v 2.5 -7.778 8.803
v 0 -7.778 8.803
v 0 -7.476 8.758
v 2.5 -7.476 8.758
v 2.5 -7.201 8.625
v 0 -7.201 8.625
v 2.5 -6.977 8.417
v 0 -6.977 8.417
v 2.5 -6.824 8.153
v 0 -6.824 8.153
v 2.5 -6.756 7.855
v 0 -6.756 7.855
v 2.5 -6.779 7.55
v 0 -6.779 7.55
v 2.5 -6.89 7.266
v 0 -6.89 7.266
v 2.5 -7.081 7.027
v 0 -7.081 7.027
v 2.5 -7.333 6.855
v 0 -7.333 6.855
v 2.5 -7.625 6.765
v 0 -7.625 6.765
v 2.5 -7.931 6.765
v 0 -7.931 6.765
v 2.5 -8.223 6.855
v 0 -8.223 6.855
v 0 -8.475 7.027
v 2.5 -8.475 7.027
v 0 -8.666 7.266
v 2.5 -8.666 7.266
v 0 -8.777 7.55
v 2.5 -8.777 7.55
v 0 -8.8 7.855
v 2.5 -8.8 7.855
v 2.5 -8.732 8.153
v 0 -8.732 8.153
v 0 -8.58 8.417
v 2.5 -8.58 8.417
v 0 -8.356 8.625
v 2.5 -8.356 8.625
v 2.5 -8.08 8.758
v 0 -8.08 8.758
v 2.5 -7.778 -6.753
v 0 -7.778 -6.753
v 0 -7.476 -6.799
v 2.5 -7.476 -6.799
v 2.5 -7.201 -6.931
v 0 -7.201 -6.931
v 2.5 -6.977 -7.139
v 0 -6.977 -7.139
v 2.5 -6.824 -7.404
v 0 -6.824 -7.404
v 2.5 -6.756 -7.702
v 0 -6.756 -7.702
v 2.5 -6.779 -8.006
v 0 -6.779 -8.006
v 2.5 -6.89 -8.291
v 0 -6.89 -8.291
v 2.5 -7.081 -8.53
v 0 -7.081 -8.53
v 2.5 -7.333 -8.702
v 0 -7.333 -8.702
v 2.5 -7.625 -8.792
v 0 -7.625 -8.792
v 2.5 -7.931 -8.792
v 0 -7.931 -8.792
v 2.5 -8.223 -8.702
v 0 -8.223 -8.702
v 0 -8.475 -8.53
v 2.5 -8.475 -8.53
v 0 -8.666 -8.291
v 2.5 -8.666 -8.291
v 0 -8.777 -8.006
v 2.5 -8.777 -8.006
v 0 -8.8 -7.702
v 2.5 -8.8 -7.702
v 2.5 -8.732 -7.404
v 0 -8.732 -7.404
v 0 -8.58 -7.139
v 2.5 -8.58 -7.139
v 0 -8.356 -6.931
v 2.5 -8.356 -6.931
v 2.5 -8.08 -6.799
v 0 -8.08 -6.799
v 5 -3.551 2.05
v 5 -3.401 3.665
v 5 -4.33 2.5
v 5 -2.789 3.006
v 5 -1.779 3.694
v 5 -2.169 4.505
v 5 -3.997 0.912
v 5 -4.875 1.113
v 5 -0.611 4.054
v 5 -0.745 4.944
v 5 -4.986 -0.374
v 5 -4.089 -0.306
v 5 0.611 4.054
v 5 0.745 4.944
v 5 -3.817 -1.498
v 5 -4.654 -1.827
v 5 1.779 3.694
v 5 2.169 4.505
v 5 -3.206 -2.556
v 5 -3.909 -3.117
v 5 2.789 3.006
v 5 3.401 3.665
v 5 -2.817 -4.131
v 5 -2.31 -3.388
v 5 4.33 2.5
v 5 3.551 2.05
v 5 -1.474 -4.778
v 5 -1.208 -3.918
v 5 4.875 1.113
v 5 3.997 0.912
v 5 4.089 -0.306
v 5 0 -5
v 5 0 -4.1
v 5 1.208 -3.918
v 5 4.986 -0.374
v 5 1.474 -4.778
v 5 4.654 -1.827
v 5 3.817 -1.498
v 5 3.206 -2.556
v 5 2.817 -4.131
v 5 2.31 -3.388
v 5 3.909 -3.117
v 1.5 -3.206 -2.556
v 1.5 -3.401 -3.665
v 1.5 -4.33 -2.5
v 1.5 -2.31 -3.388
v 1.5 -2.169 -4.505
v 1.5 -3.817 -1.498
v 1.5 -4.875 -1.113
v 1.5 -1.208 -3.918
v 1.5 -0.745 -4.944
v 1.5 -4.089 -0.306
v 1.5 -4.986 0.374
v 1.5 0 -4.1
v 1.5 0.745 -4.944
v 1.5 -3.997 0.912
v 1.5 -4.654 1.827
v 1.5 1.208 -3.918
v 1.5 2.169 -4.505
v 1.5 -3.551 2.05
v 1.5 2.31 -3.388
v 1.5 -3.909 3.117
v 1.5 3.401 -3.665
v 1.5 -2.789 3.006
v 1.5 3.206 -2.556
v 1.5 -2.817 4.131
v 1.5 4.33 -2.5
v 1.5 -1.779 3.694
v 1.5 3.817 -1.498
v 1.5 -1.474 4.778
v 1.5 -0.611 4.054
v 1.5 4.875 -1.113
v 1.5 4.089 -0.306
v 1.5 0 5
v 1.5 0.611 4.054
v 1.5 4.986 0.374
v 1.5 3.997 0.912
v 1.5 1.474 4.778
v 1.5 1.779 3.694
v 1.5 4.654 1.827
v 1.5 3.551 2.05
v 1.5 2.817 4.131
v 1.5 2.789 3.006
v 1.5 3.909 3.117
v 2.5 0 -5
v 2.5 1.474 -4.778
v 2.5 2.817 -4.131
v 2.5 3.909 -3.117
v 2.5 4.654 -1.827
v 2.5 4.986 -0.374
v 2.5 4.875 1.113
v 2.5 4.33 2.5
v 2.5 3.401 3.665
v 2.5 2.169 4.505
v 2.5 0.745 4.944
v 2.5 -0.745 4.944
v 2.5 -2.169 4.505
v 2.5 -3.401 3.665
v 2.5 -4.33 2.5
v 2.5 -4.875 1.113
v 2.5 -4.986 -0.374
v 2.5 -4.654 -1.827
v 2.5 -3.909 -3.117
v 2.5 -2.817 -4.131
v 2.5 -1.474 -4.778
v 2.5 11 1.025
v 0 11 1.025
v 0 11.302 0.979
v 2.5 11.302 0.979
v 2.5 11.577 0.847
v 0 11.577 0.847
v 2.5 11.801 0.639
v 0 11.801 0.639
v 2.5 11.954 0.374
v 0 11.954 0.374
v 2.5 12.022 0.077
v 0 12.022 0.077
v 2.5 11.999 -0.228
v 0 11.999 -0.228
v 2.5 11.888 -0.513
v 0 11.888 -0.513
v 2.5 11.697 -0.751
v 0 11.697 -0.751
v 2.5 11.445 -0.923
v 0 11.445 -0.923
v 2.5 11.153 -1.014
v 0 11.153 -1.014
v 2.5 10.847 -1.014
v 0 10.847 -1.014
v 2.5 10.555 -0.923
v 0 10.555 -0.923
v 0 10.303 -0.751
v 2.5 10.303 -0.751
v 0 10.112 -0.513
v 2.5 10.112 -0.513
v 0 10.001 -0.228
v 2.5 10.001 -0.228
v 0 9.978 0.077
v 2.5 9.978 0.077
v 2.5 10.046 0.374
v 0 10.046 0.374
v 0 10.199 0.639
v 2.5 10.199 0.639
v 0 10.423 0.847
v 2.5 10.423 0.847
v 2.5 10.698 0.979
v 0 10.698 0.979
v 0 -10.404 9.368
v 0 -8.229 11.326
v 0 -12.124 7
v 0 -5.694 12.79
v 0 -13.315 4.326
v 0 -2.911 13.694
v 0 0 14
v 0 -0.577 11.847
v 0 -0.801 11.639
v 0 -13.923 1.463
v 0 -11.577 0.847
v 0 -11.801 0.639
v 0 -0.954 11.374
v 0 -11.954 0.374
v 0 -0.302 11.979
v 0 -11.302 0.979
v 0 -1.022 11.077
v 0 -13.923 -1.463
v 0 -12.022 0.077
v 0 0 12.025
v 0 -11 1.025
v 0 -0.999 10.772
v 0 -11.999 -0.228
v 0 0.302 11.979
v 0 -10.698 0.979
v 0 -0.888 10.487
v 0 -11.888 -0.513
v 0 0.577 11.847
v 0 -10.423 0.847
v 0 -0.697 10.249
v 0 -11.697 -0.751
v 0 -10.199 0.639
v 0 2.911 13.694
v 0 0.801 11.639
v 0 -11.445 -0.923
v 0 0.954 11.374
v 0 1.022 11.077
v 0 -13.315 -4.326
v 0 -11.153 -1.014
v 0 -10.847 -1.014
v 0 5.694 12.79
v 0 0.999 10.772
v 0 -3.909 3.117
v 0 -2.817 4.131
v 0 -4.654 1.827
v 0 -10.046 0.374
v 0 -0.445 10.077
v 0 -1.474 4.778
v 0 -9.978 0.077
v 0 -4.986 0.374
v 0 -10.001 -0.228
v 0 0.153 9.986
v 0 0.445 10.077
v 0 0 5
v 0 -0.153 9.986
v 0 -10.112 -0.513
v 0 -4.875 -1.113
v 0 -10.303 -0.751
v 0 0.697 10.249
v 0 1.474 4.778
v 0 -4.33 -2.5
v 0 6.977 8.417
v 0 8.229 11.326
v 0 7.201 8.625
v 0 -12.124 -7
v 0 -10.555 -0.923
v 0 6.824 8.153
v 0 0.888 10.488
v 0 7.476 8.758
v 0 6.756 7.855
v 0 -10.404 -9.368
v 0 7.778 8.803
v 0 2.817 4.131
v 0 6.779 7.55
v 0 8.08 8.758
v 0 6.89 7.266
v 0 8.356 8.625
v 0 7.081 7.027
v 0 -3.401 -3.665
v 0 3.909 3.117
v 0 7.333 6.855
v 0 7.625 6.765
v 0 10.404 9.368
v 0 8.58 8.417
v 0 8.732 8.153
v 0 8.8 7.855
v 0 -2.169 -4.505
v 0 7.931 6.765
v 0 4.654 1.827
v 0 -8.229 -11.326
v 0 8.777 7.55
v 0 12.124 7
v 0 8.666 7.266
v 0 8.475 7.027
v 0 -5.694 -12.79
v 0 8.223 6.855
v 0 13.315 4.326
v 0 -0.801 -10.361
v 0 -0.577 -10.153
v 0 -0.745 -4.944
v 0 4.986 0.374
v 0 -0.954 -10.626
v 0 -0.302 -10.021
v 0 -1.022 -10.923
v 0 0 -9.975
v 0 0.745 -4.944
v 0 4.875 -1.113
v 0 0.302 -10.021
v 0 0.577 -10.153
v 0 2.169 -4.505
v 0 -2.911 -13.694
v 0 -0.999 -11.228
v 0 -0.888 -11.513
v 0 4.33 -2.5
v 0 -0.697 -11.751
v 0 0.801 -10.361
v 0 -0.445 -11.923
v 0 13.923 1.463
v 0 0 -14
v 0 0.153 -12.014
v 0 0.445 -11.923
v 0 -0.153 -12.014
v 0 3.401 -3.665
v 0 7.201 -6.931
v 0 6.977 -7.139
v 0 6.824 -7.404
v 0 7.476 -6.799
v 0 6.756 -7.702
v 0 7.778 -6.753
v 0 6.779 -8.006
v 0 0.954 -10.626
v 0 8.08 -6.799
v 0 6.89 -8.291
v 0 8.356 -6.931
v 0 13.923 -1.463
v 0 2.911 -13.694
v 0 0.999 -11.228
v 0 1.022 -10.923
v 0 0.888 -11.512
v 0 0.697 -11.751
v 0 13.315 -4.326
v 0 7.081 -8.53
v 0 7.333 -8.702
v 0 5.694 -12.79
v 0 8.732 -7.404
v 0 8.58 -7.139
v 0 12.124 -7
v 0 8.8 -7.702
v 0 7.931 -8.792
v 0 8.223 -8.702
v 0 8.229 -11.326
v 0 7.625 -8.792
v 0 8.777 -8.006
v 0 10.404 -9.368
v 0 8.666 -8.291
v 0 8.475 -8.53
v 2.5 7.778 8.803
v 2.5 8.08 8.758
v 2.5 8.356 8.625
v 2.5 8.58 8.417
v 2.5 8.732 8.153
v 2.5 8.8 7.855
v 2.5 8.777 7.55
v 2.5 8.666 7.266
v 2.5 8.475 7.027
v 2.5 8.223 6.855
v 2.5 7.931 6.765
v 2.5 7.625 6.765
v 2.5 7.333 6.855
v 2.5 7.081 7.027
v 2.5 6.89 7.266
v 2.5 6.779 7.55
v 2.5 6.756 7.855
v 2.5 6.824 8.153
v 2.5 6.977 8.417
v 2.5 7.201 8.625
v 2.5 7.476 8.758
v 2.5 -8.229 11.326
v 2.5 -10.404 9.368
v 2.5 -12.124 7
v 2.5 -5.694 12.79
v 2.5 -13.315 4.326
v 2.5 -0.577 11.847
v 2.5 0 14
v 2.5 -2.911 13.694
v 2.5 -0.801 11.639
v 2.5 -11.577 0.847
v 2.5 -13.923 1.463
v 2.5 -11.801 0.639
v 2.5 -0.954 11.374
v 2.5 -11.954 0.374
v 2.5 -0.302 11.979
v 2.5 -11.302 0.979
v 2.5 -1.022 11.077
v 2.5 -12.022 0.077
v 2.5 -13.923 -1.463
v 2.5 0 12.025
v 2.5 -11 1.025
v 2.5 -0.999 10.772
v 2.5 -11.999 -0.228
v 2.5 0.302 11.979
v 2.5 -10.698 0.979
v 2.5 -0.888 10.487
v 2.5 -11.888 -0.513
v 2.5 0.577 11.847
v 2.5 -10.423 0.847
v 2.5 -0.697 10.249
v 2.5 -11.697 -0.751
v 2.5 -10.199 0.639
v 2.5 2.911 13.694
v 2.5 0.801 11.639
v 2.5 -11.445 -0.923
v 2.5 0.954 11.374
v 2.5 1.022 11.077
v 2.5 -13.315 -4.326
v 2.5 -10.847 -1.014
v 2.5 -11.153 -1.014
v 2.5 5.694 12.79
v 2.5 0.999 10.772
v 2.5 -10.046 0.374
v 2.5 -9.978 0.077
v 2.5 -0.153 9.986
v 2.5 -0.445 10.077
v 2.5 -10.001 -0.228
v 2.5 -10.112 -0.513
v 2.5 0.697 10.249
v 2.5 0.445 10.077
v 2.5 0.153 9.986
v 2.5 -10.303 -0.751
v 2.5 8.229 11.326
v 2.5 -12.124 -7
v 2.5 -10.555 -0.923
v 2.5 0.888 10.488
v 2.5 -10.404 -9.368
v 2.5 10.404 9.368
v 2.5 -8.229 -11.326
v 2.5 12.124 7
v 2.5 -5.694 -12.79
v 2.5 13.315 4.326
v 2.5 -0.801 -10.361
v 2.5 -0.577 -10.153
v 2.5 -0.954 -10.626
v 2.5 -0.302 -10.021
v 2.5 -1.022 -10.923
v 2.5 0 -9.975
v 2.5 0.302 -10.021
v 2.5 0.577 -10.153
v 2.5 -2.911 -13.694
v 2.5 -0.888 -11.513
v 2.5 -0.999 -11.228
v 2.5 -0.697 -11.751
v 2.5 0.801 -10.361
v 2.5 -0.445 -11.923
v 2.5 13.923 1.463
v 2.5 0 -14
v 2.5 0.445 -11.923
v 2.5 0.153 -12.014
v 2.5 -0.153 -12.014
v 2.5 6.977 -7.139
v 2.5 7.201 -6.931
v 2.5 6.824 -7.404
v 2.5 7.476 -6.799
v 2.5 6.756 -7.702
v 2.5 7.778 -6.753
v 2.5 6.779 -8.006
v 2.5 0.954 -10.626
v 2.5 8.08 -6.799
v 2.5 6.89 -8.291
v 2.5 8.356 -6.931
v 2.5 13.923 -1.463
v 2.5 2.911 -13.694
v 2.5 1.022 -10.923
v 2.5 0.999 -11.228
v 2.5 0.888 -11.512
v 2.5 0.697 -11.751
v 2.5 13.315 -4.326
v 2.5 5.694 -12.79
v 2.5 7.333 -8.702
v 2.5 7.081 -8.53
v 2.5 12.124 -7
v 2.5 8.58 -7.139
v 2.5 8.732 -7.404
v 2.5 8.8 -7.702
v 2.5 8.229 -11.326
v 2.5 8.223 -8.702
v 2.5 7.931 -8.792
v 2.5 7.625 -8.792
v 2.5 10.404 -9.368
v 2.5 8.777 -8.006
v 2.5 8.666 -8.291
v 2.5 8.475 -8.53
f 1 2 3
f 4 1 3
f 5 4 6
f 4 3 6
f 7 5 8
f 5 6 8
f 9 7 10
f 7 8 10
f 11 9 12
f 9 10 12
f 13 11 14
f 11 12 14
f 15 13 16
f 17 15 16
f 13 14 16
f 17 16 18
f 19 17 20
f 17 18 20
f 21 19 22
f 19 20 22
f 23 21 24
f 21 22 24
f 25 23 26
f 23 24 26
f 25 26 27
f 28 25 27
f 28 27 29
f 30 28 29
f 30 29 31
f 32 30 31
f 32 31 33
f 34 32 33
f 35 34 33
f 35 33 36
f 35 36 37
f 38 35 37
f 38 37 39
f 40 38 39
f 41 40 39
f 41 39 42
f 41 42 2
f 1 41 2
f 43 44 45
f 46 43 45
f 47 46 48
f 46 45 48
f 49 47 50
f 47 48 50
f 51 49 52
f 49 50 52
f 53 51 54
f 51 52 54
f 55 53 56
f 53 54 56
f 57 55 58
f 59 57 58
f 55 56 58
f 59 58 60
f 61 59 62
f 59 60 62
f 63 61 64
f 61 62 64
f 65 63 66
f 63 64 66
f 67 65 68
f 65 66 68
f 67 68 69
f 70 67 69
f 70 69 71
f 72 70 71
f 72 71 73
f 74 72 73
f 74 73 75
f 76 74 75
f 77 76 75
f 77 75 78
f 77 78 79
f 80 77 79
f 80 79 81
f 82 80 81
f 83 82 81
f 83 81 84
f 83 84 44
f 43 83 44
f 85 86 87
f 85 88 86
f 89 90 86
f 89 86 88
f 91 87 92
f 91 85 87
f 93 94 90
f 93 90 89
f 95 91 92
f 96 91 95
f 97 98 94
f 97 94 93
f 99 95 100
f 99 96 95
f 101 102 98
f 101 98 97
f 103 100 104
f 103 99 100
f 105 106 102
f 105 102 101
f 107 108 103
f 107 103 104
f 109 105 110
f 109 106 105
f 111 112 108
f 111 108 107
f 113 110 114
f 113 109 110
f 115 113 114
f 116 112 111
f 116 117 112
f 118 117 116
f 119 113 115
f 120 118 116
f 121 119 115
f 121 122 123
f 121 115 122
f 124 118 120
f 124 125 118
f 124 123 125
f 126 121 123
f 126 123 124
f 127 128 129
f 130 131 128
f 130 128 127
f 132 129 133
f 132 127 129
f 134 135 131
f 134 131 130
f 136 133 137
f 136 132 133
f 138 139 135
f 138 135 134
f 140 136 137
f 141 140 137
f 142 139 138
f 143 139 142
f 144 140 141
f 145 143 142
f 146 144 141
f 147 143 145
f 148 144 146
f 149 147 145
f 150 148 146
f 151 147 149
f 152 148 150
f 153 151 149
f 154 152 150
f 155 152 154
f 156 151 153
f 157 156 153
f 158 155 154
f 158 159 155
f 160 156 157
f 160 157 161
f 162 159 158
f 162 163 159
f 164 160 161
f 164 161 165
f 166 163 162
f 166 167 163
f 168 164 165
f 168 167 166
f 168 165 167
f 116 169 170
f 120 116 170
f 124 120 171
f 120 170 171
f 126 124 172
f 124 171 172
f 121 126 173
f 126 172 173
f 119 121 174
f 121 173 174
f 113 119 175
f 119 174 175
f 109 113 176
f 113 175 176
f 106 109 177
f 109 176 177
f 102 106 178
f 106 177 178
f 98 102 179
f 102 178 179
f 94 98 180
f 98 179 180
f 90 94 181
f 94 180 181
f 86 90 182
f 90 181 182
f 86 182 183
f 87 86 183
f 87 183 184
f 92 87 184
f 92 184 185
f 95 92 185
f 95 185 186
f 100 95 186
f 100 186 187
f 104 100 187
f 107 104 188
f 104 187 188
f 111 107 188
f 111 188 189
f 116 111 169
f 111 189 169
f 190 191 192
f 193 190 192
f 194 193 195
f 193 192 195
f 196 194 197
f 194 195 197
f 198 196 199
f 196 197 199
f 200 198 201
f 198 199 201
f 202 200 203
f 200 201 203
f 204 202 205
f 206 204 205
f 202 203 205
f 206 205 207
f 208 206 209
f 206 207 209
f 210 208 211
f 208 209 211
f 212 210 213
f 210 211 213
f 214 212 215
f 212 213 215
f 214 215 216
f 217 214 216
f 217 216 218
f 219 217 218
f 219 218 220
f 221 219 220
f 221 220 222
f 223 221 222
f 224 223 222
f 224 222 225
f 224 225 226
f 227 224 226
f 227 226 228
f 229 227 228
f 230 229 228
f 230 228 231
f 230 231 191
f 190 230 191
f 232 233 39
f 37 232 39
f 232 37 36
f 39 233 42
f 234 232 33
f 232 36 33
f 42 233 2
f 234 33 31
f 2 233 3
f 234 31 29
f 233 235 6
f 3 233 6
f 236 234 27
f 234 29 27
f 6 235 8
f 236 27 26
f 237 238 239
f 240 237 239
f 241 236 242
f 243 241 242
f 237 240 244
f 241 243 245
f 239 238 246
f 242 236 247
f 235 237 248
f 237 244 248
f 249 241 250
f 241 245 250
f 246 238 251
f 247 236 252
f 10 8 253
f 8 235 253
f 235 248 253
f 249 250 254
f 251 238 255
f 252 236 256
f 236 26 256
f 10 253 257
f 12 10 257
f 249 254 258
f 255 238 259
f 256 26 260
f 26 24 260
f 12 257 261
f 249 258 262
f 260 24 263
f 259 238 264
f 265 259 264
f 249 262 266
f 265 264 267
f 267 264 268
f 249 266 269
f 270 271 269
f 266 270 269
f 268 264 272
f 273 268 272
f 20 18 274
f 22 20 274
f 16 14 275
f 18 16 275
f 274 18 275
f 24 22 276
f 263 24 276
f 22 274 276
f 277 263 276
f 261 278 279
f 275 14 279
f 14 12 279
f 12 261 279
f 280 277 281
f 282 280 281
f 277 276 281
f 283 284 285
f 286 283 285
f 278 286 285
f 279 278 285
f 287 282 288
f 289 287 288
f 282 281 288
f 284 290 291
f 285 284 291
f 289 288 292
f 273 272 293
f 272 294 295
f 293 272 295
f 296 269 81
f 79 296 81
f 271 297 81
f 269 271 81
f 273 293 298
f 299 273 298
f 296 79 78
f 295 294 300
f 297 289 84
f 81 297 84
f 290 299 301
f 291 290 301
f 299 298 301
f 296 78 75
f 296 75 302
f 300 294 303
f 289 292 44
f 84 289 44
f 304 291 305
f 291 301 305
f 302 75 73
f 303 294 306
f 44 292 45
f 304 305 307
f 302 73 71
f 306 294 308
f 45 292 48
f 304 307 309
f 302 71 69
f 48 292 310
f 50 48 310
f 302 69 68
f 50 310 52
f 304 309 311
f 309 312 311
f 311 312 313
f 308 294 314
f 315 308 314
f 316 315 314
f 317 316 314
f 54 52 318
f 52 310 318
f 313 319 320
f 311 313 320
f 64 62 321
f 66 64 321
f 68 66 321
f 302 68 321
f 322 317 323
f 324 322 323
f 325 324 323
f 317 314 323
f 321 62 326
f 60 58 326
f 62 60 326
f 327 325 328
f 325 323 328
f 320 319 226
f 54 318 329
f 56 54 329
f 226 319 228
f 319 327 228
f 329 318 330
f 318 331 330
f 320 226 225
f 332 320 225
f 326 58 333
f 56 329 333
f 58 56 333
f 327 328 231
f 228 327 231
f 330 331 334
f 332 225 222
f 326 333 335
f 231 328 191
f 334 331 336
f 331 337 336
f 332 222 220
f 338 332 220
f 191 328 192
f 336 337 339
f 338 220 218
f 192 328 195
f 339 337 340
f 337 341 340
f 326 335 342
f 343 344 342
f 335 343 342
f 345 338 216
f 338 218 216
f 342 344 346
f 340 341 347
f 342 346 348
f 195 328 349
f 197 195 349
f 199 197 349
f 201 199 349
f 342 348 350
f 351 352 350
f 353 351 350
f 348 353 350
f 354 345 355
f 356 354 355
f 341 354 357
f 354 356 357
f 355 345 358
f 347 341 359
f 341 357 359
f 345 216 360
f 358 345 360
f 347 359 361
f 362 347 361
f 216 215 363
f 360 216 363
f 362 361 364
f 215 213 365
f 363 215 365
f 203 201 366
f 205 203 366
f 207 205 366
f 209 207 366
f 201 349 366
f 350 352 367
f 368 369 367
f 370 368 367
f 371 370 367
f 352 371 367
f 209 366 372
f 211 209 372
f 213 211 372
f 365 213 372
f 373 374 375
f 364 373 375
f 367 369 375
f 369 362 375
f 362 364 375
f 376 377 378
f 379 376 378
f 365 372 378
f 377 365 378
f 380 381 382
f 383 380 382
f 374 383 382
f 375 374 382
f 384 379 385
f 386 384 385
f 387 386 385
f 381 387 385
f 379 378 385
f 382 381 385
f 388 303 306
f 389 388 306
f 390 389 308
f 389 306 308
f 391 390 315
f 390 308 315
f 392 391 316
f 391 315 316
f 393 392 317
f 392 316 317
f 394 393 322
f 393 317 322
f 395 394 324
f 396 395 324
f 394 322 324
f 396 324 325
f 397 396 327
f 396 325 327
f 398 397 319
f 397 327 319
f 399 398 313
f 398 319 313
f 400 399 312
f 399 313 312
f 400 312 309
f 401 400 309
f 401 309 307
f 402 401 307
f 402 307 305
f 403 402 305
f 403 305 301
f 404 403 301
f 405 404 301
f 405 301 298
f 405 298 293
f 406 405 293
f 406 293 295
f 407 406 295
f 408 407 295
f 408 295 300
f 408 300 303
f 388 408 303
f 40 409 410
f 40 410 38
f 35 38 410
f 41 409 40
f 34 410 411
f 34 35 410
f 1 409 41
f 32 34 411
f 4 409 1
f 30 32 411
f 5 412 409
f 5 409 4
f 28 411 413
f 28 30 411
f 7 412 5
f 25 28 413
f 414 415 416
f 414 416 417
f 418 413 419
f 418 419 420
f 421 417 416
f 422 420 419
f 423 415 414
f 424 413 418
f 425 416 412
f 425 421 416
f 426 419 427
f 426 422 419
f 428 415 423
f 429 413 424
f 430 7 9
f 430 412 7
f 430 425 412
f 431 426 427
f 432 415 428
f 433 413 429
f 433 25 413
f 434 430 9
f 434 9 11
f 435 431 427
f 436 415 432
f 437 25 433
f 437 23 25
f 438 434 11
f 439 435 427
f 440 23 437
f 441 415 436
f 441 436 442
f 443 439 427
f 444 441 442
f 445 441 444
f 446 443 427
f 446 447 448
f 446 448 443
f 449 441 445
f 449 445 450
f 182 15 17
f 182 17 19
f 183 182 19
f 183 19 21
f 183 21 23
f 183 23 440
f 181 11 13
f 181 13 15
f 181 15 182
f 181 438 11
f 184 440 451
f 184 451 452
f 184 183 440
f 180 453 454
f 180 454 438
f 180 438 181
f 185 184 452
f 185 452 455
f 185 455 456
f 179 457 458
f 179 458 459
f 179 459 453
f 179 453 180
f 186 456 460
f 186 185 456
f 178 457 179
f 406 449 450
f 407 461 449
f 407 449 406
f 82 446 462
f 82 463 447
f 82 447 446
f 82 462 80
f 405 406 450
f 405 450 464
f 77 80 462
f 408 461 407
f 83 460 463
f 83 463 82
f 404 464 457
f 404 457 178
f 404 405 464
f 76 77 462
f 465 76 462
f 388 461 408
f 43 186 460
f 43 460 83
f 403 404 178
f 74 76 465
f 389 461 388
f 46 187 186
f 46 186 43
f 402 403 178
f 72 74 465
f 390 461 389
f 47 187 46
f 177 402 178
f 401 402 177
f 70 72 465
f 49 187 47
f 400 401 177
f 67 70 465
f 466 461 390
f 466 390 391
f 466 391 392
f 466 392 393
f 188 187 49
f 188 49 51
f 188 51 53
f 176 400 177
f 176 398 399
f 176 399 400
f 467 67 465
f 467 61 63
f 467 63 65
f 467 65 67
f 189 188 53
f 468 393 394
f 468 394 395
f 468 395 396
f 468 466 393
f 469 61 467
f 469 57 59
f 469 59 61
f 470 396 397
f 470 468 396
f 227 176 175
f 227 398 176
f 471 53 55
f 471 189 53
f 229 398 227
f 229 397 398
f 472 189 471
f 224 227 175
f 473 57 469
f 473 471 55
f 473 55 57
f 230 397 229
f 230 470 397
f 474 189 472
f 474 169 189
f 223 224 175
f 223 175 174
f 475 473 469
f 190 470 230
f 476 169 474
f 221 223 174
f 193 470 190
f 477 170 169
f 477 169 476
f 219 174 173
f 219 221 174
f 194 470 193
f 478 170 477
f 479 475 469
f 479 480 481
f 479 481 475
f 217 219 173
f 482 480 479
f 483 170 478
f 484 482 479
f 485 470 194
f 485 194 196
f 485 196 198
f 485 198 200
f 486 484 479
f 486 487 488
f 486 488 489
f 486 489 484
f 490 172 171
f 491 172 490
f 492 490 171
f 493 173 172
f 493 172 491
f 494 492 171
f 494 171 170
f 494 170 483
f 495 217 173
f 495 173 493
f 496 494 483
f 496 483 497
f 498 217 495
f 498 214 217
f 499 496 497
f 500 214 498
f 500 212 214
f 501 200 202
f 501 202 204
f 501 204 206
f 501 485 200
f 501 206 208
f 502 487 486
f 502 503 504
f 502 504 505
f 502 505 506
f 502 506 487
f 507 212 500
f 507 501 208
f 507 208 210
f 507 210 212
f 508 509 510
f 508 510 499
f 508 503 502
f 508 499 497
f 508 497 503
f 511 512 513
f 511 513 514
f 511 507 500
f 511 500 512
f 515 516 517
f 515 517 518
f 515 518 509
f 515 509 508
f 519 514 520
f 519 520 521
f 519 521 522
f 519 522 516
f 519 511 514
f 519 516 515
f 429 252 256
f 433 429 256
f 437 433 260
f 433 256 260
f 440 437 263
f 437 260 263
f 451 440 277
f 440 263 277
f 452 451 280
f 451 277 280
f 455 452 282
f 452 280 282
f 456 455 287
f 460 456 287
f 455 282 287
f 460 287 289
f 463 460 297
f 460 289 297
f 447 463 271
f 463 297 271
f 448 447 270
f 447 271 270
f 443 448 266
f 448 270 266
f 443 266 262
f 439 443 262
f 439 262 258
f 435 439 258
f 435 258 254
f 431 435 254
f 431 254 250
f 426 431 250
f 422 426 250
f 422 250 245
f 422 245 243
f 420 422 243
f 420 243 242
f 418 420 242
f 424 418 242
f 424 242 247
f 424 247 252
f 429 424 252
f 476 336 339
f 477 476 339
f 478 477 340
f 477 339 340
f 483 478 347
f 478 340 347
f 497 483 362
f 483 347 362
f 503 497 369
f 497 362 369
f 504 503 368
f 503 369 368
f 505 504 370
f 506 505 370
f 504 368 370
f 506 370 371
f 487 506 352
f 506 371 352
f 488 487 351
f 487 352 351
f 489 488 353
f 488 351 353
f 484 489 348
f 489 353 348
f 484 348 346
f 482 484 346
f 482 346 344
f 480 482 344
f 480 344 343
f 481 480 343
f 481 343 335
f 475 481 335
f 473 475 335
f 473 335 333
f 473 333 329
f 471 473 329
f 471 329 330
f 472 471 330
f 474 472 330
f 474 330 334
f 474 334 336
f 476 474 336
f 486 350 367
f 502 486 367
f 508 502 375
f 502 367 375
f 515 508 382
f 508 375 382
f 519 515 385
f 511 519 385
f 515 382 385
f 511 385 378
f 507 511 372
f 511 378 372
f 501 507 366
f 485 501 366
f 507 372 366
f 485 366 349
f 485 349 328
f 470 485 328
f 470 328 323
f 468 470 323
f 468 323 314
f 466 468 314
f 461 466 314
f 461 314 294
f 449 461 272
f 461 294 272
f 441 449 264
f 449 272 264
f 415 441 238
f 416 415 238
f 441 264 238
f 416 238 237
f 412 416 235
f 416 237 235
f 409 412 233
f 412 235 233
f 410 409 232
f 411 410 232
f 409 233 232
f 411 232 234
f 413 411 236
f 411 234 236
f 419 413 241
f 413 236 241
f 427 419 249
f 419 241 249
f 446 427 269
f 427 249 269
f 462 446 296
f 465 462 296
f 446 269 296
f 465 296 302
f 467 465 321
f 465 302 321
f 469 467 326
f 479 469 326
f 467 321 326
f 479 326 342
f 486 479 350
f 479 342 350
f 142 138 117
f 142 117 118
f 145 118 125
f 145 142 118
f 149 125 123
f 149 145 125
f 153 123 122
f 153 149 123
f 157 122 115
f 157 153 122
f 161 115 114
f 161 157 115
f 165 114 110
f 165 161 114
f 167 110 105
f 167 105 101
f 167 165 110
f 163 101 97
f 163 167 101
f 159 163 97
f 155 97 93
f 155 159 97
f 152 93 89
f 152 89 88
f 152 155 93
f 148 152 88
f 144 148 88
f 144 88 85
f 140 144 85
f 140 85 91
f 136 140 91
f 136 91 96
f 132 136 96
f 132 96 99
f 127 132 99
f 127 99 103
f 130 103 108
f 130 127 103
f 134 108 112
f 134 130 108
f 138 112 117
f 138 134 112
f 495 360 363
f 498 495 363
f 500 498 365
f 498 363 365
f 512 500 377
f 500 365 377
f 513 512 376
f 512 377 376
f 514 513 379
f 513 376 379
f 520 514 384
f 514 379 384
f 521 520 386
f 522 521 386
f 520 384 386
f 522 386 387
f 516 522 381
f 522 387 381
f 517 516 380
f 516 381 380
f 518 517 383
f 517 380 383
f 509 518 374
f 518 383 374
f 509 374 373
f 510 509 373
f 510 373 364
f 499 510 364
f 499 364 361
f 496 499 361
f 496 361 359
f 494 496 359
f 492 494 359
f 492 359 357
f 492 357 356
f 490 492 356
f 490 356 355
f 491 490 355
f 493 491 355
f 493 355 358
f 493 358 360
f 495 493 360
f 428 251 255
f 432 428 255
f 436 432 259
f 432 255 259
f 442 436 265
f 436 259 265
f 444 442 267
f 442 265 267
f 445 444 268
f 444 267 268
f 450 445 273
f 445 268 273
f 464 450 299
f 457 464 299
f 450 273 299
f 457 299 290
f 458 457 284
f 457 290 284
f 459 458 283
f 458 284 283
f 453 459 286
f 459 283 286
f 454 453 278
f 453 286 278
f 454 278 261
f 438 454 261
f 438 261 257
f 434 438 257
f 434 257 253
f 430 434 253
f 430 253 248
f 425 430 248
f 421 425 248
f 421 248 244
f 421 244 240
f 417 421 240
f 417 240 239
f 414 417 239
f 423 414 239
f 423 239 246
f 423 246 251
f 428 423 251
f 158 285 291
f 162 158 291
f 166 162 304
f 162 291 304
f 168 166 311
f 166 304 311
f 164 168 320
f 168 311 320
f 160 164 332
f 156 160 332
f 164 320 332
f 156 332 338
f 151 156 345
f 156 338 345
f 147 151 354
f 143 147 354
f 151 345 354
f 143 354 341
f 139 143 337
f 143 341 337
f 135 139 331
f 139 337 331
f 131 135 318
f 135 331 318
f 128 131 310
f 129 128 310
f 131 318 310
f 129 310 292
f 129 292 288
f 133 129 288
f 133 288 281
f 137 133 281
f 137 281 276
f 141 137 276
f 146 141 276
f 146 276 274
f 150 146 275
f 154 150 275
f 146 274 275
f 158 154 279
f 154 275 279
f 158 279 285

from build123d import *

# Parameters (mm, degrees)
SKETCH1_R                = 14
SKETCH1_R_2              = 4.1
BOSS_EXTRUDE1_DEPTH      = 2.5
SKETCH2_R                = 5
SKETCH2_R_2              = 4.1
BOSS_EXTRUDE2_DEPTH      = 2.5
M2_5X0_45_TAPPED_HOLE1_D = 2.05
SKETCH7_R                = 5
CUT_EXTRUDE1_DEPTH       = 1.5


with BuildPart() as part:
    # Sketch1 → Boss-Extrude1 (new body)
    with BuildSketch(Plane(origin=(0, 0, 0), x_dir=(0, 0, -1), z_dir=(1, 0, 0))):
        Circle(SKETCH1_R)
        Circle(SKETCH1_R_2, mode=Mode.SUBTRACT)
    extrude(amount=BOSS_EXTRUDE1_DEPTH)

    # Sketch2 → Boss-Extrude2 (add)
    with BuildSketch(Plane(origin=(2.5, 0, 0), x_dir=(0, 0, -1), z_dir=(1, 0, 0))):
        Circle(SKETCH2_R)
        Circle(SKETCH2_R_2, mode=Mode.SUBTRACT)
    extrude(amount=BOSS_EXTRUDE2_DEPTH)

    # M2.5x0.45 Tapped Hole1 (through all)
    with Locations(Plane(origin=(5, 0, 0), x_dir=(0, 0, -1), z_dir=(1, 0, 0))):
        with Locations((0, 11), (7.778174593, 7.778174593), (11, 0), (7.778174593, -7.778174593), (0, -11), (-7.778174593, -7.778174593), (-11, 0), (-7.778174593, 7.778174593), (0, 0)):
            Hole(M2_5X0_45_TAPPED_HOLE1_D / 2)

    # Sketch7 → Cut-Extrude1 (cut)
    with BuildSketch(Plane.ZY):
        Circle(SKETCH7_R)
    extrude(amount=-CUT_EXTRUDE1_DEPTH, mode=Mode.SUBTRACT)


solid = part.part
